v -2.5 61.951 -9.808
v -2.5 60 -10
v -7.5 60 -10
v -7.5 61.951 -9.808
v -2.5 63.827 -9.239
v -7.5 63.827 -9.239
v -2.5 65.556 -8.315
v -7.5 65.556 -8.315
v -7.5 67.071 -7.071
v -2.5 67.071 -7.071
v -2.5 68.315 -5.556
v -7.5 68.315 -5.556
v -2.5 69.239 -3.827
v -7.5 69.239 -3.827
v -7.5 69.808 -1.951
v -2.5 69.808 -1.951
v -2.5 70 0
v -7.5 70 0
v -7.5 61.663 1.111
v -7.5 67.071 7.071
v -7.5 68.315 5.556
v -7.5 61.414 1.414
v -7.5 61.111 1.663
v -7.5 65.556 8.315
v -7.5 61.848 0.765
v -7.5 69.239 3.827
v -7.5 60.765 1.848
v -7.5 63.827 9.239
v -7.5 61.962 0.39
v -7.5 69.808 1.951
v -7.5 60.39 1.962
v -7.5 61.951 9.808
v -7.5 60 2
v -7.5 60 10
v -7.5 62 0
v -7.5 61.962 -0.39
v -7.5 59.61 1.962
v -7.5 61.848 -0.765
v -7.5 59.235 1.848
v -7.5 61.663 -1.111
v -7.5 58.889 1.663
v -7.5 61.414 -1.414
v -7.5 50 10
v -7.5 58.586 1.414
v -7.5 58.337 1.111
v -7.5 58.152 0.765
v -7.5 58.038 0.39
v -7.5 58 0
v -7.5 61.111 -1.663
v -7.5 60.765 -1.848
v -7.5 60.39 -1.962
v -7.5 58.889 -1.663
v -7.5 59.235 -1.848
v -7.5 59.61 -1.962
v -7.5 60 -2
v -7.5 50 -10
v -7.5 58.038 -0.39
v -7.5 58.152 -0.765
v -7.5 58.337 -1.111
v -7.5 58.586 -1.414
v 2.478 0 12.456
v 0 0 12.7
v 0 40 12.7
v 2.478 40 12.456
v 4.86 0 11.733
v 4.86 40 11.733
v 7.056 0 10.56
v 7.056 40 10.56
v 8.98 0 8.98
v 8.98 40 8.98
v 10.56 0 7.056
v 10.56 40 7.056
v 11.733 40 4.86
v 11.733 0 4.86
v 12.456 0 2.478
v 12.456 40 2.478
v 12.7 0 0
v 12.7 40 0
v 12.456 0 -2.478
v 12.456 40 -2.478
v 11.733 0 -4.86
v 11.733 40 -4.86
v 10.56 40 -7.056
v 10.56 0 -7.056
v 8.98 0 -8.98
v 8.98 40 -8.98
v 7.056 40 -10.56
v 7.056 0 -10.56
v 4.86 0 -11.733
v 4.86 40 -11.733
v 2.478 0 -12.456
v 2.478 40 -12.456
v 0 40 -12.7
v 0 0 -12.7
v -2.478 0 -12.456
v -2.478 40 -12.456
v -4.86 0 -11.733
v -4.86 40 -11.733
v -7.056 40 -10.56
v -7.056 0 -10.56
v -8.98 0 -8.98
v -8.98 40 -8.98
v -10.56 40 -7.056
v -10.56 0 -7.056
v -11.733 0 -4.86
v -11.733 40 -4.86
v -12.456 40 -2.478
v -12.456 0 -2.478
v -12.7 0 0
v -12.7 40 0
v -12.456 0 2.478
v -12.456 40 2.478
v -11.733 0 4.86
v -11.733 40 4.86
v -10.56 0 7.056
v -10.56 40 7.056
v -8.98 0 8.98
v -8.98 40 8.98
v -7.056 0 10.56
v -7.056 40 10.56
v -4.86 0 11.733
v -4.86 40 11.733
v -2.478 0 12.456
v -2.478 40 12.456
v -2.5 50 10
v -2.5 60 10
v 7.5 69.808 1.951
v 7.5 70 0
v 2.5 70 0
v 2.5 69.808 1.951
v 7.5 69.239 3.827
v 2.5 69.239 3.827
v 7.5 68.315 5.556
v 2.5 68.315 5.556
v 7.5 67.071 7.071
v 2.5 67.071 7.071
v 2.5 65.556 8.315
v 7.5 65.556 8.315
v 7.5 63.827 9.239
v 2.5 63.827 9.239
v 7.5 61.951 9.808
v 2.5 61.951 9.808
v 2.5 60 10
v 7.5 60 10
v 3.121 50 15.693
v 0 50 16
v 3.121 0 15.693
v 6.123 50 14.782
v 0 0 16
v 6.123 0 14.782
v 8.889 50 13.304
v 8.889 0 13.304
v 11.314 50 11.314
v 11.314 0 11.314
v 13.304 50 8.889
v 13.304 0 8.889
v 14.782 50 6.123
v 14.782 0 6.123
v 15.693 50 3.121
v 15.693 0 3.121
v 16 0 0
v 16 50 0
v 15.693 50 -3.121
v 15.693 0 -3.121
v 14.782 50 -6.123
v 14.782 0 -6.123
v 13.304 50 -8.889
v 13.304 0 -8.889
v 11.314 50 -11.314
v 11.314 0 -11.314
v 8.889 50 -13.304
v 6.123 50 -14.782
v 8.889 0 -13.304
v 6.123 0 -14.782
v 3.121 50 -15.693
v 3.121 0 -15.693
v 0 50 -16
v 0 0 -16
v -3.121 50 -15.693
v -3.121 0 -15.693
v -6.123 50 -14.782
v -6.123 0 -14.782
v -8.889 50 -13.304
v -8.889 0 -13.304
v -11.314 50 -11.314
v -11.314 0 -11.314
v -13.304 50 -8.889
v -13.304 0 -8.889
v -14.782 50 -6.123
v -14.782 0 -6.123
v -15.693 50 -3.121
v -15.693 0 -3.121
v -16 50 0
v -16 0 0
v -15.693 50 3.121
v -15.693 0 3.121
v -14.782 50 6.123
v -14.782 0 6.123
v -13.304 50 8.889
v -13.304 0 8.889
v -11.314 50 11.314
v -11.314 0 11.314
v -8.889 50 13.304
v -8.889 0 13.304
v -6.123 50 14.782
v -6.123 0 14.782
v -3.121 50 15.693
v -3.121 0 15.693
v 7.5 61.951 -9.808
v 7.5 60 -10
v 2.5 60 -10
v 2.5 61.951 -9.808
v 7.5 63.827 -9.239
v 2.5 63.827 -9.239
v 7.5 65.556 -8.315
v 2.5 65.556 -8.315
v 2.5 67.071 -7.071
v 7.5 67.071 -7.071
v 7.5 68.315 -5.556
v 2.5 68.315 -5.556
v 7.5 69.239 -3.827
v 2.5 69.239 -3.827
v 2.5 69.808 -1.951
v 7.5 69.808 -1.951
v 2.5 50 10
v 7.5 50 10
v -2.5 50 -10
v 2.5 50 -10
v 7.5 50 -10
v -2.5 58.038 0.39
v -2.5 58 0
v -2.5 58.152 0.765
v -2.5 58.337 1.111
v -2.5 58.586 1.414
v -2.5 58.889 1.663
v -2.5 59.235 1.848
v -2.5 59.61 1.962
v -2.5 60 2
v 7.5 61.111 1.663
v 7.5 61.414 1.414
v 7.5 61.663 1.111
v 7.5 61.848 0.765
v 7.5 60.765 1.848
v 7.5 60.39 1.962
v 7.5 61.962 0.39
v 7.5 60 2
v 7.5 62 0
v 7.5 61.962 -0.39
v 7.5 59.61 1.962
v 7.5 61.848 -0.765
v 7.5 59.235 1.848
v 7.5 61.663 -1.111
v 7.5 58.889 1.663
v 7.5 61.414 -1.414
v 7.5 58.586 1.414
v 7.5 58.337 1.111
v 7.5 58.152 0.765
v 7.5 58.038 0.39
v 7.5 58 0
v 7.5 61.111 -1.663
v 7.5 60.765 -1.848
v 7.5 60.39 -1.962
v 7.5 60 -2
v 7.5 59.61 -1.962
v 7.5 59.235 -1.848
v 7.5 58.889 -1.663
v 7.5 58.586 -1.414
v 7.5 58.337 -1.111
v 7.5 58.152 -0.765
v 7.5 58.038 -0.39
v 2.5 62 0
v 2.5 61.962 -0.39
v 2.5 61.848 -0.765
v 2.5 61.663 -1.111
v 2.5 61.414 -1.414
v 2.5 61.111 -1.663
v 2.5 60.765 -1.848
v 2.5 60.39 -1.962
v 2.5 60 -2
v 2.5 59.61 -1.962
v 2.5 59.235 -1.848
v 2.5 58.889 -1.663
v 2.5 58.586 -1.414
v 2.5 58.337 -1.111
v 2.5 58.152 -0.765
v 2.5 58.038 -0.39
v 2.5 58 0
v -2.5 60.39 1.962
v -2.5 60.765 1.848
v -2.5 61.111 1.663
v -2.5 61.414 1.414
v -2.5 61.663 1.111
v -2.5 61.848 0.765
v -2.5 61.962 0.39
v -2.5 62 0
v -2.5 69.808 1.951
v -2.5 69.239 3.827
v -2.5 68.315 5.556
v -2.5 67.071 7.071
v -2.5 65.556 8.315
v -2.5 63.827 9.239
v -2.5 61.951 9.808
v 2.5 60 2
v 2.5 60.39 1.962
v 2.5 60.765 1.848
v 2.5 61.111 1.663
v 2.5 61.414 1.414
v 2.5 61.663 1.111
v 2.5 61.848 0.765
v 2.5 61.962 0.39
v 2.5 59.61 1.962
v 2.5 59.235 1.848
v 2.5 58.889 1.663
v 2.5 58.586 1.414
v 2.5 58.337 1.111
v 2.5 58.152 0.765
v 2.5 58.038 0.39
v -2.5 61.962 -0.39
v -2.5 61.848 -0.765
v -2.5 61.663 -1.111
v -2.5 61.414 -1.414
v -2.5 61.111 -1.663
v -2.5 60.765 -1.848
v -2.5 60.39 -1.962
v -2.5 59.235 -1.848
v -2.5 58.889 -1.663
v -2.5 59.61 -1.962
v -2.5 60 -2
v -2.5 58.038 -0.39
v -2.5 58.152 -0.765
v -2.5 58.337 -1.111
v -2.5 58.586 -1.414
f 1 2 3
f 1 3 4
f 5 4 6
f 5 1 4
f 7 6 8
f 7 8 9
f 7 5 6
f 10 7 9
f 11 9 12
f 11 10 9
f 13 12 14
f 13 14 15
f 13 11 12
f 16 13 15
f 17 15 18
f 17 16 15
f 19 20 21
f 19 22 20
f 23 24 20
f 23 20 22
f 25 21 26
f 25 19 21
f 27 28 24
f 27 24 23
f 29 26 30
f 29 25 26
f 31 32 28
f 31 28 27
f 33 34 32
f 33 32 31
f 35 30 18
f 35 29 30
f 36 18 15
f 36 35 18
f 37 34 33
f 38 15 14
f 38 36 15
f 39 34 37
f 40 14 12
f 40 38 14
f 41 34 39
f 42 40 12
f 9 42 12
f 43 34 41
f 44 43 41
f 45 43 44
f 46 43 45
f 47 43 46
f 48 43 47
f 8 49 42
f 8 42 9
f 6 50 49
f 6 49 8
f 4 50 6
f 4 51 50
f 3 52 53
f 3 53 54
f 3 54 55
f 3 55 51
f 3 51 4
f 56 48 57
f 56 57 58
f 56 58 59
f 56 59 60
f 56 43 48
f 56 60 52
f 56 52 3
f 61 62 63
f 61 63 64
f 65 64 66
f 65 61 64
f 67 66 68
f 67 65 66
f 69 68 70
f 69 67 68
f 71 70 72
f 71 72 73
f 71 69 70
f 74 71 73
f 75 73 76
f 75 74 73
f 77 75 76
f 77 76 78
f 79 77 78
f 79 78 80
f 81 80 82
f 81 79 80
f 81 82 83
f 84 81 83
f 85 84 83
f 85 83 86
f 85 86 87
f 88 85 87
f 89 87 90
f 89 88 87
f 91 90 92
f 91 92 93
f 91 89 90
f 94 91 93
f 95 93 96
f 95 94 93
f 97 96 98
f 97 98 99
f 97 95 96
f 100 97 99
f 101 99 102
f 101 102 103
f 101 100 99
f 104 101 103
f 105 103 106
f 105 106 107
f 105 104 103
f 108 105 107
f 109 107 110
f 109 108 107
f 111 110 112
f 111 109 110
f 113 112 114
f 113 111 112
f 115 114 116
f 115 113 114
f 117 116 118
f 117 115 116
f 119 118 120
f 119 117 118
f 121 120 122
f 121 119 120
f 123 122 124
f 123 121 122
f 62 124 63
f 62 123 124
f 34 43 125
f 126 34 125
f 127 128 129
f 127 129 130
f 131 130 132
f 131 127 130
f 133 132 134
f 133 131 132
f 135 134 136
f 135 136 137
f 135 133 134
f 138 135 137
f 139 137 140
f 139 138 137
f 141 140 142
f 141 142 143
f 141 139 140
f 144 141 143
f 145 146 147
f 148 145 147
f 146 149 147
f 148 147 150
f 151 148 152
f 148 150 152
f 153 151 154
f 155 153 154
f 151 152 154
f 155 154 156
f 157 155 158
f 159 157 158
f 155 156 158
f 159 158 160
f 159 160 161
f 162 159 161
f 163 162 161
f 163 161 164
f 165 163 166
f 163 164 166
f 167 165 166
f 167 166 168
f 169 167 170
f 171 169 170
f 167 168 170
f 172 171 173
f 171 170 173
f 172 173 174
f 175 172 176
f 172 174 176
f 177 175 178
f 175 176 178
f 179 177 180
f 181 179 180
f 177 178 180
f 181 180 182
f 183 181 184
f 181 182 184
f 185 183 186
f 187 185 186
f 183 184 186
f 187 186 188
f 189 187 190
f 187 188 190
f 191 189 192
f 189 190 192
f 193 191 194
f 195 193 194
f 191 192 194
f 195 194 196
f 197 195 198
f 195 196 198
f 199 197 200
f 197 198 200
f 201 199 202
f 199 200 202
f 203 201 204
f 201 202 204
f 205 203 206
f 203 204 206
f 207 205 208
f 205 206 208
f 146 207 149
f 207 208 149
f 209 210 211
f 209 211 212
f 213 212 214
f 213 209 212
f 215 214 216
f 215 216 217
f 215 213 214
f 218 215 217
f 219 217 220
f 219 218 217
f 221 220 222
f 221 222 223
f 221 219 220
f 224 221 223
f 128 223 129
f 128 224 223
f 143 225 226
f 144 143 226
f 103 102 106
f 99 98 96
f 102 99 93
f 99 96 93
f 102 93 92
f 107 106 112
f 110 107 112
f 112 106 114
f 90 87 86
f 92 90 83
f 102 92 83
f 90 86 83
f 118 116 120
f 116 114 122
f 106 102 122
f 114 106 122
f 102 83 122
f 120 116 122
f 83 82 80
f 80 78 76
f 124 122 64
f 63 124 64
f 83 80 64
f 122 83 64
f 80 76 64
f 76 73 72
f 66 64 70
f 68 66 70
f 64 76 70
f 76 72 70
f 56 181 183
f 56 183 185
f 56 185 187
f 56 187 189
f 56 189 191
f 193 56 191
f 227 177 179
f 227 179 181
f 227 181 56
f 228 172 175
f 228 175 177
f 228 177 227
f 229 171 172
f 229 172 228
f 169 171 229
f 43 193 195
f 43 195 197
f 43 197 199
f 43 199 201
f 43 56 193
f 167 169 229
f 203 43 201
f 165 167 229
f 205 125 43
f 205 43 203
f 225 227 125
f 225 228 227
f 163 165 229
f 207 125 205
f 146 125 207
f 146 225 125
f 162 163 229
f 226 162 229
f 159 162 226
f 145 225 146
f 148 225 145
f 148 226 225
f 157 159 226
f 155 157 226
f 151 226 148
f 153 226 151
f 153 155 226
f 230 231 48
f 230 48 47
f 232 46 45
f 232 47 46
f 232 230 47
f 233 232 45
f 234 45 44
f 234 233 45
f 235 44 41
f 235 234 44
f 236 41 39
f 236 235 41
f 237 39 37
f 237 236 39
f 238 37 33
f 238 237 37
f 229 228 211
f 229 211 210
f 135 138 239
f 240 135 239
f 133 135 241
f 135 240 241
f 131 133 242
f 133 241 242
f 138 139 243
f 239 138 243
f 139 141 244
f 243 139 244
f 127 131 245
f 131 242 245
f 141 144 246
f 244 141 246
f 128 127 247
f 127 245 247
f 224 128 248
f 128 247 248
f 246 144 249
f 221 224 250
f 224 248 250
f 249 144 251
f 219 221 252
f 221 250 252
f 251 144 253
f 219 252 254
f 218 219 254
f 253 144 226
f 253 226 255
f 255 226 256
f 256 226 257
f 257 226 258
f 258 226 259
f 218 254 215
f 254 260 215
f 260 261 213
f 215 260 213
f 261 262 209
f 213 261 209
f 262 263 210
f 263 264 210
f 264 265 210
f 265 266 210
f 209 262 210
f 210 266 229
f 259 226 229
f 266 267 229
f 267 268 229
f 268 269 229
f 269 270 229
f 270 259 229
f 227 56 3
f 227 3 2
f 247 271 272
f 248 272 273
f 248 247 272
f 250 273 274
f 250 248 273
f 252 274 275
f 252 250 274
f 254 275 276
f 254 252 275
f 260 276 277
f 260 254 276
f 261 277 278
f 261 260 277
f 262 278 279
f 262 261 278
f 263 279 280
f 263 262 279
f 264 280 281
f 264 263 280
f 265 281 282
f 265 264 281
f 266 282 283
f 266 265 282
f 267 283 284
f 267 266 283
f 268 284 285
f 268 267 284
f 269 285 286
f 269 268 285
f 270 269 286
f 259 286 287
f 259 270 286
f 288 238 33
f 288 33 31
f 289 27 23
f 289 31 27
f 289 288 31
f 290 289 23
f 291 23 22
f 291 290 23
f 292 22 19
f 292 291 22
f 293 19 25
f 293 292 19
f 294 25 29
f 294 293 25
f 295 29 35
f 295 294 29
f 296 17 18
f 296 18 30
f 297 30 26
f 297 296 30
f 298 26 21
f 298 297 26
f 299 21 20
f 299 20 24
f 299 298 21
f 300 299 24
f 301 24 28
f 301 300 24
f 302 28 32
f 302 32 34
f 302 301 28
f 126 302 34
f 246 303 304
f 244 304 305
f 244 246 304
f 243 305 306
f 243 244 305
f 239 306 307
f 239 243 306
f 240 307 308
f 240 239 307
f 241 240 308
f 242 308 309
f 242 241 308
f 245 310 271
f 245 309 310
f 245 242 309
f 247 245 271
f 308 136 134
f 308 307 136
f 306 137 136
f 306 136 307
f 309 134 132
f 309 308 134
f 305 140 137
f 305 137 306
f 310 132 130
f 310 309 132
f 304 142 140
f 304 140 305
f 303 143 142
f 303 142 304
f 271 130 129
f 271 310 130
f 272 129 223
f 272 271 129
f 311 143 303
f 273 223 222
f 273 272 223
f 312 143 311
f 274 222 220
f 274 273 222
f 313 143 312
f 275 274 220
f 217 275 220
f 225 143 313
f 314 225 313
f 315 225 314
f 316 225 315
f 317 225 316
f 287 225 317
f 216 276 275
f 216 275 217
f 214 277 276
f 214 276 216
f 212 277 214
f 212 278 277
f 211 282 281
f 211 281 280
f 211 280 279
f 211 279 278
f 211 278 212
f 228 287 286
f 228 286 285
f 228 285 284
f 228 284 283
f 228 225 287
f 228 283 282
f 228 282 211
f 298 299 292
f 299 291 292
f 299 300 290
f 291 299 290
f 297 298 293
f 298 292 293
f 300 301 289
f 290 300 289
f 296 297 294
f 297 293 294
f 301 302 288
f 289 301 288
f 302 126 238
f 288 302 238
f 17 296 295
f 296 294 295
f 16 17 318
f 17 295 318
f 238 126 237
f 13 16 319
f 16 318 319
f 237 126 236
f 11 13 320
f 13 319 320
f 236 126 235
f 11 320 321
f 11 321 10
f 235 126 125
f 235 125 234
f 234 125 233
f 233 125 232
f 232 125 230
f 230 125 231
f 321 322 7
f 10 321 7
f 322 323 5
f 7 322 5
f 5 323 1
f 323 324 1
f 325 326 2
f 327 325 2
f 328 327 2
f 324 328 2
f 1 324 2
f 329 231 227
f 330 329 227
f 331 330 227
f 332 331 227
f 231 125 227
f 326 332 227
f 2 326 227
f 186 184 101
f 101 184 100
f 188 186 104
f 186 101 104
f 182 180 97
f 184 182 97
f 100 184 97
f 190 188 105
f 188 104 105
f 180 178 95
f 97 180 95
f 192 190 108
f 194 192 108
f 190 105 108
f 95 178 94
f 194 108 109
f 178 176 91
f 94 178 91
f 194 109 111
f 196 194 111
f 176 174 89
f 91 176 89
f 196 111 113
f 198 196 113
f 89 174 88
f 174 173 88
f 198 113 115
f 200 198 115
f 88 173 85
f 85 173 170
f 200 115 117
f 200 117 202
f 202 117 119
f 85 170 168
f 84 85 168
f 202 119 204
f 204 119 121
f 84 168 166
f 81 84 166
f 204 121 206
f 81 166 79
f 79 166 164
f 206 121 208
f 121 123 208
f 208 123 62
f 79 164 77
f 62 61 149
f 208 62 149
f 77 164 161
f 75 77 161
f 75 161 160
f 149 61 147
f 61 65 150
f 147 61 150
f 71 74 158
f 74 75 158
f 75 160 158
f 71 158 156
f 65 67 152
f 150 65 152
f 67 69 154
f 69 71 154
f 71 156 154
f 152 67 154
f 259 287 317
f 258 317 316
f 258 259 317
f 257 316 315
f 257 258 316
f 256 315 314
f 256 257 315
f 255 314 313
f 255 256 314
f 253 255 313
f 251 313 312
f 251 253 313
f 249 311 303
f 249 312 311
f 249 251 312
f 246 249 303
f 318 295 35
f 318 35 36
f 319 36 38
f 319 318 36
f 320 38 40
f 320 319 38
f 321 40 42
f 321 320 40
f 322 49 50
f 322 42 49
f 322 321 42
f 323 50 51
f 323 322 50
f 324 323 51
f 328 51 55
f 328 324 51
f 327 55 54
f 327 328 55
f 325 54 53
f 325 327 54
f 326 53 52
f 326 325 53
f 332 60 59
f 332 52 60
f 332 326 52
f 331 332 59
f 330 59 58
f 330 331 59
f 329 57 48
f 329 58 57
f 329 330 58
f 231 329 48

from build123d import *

# Parameters (mm, degrees)
SKETCH1_R               = 16
SKETCH1_R_2             = 12.7
BOSS_EXTRUDE1_DEPTH     = 40
SKETCH2_R               = 16
BOSS_EXTRUDE2_DEPTH     = 10
SKETCH3_W               = 5
SKETCH3_H               = 20
BOSS_EXTRUDE3_DEPTH     = 20
CUT_EXTRUDE1_DEPTH      = 15
CUT_EXTRUDE1_DEPTH_BACK = 5


with BuildPart() as part:
    # Sketch1 → Boss-Extrude1 (new body)
    with BuildSketch(Plane(origin=(0, 0, 0), x_dir=(1, 0, 0), z_dir=(0, 1, 0))):
        with Locations(Location((0, 0, 0), (0, 0, 270))):
            Circle(SKETCH1_R)
        with Locations(Location((0, 0, 0), (0, 0, 270))):
            Circle(SKETCH1_R_2, mode=Mode.SUBTRACT)
    extrude(amount=BOSS_EXTRUDE1_DEPTH)

    # Sketch2 → Boss-Extrude2 (add)
    with BuildSketch(Plane(origin=(0, 40, 0), x_dir=(1, 0, 0), z_dir=(0, 1, 0))):
        with Locations(Location((0, 0, 0), (0, 0, 270))):
            Circle(SKETCH2_R)
    extrude(amount=BOSS_EXTRUDE2_DEPTH)

    # Sketch3 → Boss-Extrude3 (add)
    with BuildSketch(Plane(origin=(0, 50, 0), x_dir=(1, 0, 0), z_dir=(0, 1, 0))):
        with Locations((-5, 0)):
            Rectangle(SKETCH3_W, SKETCH3_H)
        with Locations((5, 0)):
            Rectangle(SKETCH3_W, SKETCH3_H)
    extrude(amount=BOSS_EXTRUDE3_DEPTH)

    # Sketch4 → Cut-Extrude1 (cut, two sides: drawn at the far end of the back side and taken through both)
    with BuildSketch(Plane.ZY.offset(-2.5).offset(-CUT_EXTRUDE1_DEPTH_BACK)):
        with BuildLine():
            Line((0, 70), (-10, 70))
            Line((-10, 70), (-10, 60))
            ThreePointArc((-10, 60), (-7.071067812, 67.071067812), (0, 70))
        make_face()
        with BuildLine():
            Line((10, 70), (0, 70))
            ThreePointArc((0, 70), (7.071067812, 67.071067812), (10, 60))
            Line((10, 60), (10, 70))
        make_face()
        with BuildLine():
            Line((0, 58), (0, 62))
            ThreePointArc((0, 62), (-2, 60), (0, 58))
        make_face()
        with BuildLine():
            ThreePointArc((2, 60), (1.414213562, 61.414213562), (0, 62))
            Line((0, 62), (0, 58))
            ThreePointArc((0, 58), (1.414213562, 58.585786438), (2, 60))
        make_face()
    extrude(amount=CUT_EXTRUDE1_DEPTH + CUT_EXTRUDE1_DEPTH_BACK, mode=Mode.SUBTRACT)


solid = part.part
